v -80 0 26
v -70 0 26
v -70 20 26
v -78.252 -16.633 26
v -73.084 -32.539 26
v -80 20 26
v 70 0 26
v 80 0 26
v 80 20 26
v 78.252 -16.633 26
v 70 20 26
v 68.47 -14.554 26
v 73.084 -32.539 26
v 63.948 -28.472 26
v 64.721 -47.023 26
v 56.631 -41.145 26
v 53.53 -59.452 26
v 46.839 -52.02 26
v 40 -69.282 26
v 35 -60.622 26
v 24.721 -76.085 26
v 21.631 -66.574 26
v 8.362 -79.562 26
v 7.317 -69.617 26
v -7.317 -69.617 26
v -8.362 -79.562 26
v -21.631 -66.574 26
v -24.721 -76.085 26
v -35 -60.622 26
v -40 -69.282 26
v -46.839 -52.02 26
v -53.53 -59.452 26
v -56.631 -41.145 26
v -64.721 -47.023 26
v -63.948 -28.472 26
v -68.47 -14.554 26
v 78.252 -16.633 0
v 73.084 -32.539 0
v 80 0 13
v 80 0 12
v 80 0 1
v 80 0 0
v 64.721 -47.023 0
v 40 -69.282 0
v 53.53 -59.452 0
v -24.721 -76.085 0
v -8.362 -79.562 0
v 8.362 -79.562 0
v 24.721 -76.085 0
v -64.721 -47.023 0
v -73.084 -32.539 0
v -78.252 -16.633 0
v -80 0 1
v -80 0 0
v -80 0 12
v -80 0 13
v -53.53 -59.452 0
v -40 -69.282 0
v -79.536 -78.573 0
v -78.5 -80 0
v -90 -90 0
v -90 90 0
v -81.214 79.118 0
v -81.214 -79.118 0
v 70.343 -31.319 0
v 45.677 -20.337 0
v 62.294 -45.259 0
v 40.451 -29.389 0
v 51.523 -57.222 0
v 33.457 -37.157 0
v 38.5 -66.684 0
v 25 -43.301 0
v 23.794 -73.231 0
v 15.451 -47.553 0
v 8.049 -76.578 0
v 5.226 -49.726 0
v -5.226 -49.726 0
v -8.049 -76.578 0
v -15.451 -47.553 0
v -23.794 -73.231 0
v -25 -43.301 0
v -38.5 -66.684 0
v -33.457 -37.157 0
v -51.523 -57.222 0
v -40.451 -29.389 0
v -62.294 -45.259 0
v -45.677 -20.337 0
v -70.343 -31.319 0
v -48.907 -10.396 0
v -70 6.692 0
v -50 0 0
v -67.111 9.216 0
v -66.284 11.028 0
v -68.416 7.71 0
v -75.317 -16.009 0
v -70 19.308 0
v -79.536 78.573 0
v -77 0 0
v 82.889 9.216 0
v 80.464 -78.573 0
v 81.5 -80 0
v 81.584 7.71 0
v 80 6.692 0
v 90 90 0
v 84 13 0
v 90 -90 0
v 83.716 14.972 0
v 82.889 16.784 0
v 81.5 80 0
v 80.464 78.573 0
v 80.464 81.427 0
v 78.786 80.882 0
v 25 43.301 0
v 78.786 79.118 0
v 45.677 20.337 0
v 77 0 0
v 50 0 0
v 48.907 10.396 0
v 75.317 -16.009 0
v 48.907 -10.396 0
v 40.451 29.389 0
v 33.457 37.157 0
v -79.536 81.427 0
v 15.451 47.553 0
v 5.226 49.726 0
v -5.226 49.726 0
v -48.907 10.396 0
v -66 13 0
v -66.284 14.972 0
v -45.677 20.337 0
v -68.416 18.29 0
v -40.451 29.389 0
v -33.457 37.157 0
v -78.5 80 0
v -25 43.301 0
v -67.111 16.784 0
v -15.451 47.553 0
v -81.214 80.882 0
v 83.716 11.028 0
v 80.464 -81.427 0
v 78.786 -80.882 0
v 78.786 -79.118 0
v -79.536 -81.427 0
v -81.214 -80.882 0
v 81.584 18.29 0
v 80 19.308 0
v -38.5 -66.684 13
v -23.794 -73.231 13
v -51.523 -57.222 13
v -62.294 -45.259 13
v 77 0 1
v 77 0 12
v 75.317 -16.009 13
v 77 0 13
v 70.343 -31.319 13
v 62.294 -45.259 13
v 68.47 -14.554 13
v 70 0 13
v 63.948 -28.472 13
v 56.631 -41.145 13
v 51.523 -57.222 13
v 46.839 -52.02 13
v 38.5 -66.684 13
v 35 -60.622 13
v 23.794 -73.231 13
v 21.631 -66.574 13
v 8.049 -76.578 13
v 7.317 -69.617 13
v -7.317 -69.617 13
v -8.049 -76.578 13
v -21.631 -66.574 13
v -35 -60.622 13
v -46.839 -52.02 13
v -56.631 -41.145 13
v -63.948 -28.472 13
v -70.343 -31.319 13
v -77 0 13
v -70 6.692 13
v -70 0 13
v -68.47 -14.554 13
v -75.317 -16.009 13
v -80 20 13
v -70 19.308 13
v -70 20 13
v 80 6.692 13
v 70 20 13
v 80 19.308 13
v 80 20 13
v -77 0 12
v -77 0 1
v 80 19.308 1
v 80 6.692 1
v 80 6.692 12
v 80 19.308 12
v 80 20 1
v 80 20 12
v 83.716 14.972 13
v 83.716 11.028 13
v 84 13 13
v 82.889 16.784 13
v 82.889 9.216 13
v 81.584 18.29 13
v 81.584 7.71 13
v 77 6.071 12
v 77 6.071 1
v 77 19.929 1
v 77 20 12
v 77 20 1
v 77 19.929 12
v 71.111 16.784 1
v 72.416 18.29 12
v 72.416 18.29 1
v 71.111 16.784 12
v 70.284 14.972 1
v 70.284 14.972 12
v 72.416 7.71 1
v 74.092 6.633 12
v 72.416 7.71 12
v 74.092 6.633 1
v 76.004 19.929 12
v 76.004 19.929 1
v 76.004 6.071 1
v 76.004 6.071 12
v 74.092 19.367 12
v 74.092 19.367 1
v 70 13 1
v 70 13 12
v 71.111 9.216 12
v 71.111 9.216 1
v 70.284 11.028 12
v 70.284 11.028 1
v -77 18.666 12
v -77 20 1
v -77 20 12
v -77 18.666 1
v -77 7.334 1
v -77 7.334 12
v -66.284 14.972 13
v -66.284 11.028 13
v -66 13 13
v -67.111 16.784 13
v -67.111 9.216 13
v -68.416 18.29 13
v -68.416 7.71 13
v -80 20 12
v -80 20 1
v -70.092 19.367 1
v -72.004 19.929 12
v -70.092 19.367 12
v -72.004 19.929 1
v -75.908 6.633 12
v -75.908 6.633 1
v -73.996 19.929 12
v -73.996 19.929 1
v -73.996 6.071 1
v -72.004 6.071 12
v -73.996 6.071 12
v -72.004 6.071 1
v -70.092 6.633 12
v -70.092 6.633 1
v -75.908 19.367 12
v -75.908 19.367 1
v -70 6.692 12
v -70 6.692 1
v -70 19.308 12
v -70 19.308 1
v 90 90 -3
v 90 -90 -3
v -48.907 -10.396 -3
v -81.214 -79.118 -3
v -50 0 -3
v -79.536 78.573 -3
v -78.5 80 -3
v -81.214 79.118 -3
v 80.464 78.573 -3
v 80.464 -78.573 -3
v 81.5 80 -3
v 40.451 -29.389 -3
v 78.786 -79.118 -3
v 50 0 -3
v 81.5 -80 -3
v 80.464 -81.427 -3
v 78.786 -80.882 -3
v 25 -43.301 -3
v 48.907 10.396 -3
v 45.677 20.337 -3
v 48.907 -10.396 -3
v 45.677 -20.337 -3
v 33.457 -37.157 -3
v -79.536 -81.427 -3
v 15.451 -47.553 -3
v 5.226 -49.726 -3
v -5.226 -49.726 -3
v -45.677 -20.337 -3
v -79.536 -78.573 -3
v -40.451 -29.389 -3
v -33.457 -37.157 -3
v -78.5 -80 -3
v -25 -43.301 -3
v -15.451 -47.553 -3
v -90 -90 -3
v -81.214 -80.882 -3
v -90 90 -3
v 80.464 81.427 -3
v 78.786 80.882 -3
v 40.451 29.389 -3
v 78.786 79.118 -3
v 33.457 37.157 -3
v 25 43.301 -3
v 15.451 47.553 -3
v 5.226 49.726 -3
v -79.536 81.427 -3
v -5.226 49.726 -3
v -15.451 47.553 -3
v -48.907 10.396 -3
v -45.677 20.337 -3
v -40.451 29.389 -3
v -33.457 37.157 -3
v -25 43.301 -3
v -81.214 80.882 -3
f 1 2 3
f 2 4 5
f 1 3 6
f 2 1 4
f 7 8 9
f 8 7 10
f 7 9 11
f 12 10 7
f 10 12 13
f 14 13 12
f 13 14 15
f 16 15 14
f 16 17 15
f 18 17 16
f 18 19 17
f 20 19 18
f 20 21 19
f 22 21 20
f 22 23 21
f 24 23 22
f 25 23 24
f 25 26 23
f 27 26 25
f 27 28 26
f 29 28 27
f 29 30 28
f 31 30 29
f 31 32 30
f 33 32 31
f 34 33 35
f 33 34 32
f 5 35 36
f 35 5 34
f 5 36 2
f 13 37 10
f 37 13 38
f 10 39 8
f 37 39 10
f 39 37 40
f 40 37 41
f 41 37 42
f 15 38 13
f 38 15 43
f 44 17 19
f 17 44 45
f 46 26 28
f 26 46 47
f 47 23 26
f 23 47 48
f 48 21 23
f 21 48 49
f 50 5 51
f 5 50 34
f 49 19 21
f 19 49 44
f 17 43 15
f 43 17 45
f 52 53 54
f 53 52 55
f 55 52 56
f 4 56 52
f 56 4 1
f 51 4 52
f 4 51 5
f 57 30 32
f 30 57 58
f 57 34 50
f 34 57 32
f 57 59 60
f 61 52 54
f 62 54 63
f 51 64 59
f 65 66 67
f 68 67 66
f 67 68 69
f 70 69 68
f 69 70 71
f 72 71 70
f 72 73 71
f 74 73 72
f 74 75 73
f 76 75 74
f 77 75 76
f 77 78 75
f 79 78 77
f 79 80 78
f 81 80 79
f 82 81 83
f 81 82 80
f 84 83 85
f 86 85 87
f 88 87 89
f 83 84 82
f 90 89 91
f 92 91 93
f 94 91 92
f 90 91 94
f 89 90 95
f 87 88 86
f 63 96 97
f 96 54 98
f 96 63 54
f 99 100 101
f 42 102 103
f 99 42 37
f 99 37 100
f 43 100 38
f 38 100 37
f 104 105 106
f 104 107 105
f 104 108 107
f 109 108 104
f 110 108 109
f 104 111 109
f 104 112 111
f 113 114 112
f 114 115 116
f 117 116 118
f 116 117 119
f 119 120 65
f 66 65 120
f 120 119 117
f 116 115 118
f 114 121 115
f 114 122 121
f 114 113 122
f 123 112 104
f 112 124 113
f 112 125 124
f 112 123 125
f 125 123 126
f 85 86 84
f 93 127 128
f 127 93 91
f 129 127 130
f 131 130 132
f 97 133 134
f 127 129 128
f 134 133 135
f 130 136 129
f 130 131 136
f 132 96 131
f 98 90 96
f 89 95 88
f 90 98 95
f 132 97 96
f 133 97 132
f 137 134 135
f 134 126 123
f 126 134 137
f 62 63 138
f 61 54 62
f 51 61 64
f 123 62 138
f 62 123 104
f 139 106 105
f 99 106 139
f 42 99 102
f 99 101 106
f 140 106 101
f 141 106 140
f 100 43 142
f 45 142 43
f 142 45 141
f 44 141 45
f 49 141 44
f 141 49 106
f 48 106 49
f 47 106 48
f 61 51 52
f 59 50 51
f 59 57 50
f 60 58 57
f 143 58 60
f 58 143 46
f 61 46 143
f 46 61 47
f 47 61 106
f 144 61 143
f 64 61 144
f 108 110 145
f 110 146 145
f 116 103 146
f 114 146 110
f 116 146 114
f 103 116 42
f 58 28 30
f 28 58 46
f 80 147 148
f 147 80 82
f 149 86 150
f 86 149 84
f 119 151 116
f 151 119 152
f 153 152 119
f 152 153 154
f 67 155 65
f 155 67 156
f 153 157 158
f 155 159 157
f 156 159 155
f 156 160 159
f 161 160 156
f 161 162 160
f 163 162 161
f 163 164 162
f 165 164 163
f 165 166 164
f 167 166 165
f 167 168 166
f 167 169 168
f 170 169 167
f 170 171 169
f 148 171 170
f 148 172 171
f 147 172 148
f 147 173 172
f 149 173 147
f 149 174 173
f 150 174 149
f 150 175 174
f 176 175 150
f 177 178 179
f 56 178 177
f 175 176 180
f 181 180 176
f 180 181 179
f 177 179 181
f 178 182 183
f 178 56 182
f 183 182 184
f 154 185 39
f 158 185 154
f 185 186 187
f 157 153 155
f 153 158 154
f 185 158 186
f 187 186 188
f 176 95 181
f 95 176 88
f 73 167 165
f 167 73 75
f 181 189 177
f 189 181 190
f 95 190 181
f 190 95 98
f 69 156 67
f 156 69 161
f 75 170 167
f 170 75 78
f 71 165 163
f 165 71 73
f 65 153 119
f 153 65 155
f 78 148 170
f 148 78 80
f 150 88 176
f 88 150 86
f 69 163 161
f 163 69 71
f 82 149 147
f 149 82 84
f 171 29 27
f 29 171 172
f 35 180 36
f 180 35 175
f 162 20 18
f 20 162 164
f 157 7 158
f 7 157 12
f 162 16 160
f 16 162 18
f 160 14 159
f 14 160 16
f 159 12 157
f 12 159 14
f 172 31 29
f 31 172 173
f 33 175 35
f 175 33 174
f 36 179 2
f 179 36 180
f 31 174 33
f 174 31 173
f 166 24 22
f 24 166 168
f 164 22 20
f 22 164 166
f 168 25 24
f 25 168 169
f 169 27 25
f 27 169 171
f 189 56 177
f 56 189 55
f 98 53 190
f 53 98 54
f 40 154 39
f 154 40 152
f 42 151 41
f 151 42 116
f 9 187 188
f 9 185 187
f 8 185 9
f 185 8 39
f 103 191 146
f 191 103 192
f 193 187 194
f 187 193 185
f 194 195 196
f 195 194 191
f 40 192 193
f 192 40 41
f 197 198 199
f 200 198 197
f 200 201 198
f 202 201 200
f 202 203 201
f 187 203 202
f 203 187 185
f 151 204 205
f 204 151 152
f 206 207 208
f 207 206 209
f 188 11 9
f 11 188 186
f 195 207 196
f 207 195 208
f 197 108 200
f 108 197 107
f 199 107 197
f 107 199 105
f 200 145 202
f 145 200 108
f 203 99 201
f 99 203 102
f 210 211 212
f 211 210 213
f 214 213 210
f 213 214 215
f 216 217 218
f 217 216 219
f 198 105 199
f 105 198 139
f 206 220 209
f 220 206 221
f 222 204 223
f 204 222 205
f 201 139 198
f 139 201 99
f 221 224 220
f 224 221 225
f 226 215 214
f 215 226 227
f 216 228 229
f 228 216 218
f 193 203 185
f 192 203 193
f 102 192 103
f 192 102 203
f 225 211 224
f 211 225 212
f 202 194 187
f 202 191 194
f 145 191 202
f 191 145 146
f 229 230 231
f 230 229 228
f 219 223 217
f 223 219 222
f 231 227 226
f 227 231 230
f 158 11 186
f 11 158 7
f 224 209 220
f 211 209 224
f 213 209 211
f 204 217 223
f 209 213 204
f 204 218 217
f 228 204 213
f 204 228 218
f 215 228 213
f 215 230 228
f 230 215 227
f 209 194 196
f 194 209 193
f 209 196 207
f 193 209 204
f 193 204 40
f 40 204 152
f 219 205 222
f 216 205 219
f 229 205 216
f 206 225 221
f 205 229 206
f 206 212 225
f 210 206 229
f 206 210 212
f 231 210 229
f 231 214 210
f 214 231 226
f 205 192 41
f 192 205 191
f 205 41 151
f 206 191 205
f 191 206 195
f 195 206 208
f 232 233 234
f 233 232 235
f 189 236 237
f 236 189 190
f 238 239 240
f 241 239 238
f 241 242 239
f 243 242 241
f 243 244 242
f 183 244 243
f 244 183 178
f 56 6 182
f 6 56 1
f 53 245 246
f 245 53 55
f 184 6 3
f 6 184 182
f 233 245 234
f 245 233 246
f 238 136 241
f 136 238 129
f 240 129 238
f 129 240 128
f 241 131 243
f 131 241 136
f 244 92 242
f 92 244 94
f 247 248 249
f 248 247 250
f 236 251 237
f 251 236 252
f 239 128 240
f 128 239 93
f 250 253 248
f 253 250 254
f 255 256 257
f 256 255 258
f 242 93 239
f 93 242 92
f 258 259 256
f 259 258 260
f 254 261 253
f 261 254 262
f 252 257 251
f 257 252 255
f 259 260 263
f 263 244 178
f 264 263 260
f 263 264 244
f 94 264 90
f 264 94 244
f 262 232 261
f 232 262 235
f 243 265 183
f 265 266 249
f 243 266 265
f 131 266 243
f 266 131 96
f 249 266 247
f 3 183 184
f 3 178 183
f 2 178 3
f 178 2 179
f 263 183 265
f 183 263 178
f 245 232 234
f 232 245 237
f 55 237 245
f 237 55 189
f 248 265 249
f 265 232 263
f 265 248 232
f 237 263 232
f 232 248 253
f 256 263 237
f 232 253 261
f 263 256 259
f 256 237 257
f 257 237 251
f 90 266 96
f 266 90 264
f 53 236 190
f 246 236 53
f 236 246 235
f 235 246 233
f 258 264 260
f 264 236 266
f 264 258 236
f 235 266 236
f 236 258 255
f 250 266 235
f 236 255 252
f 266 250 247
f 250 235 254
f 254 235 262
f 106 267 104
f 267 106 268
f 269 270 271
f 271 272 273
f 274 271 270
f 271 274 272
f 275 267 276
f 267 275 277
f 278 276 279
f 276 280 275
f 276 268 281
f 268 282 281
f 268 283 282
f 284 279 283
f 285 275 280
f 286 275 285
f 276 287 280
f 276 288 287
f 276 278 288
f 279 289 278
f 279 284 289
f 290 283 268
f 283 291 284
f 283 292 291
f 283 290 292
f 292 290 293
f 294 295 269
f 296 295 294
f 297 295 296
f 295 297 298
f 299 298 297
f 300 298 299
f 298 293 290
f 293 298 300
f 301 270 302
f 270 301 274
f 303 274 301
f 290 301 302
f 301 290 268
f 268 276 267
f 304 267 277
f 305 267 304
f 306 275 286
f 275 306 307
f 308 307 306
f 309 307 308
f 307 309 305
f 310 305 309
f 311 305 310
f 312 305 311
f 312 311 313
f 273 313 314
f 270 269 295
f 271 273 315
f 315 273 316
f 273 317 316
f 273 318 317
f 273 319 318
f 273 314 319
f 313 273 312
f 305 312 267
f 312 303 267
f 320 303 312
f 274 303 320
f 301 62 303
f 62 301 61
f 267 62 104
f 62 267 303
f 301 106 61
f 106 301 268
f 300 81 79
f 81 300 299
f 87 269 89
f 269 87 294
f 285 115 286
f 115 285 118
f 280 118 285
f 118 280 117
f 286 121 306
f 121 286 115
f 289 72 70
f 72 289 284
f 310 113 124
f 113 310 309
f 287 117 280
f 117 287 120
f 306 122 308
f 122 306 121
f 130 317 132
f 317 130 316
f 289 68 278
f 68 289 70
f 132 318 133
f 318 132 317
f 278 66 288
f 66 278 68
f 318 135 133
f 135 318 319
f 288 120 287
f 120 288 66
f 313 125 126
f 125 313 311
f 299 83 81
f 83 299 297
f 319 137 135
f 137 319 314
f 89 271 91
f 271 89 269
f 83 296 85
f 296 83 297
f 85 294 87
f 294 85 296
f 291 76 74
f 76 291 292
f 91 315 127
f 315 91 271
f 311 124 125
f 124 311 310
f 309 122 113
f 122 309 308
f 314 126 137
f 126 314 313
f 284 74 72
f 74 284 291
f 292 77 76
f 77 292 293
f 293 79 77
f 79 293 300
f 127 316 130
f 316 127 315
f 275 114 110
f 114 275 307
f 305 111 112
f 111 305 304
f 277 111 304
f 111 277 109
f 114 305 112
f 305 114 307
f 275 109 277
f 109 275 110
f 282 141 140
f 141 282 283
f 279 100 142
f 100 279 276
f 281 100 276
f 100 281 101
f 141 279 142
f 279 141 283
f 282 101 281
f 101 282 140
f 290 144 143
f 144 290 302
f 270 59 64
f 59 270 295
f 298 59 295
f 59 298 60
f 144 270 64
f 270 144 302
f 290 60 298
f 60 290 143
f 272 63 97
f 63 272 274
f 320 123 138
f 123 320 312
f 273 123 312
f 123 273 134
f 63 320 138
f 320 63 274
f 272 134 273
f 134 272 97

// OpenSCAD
//toshiba air duct reducer

/* Measurements:
ring at end of toshiba provided ducting:
(measured from adapter ring to sqaure duct piece)
height: 13.40mm - 13?
outer diameter > 153mm.... caliper too small
diameter by ruler - 156ish so 155mm?
closer diameter by ruler - outer 154. maybe 155 or 153.. ugh test print fit

ring on louverd flap:

wall cutout:


*/

/* TODO
- add cutout so cosmetic upper half of ring (for ducting receiver) can be slid on top after inserting ducting?
- screw holes

*/

//30.58m filament, 6h44m print time

ductRingHeight = 13;
ductRingOuterDiameter = 154;
ductRingInnerDiameter = 140;
ductRingWidth = (ductRingOuterDiameter - ductRingInnerDiameter)/2;
ductRingCouplerWallThickness = 3;
clipVerticalGap = 1;

arbitraryDuctReceiverHeightPadding = 20;
arbitraryWallPlateThickness = 3;

ventRingOuterDiameter = 100; //TODO measure!!!!!!!!!!!!!!!!!!!!!!!!!!!!!! thi sis the hole in the wall p.ate

wallPlateWidth = 180;
screwHoleDiameter = 3;
screwHoleInset = 10;

difference(){
    //outer body of accepting ring for duct
    cylinder(ductRingHeight*2,ductRingOuterDiameter/2 + ductRingCouplerWallThickness,ductRingOuterDiameter/2 + ductRingCouplerWallThickness);
    
    //remove area for ring at end of ducting
    cylinder(ductRingHeight,ductRingOuterDiameter/2,ductRingOuterDiameter/2);
    
    //remove area down-duct from outer ring of ducting
    translate([0,0,ductRingHeight]){
        cylinder(ductRingHeight,ductRingInnerDiameter/2,ductRingInnerDiameter/2);
    }
    
    //remove top half of ring so duct can slid in
    translate([-(ductRingOuterDiameter/2 + ductRingCouplerWallThickness),0,0]){
        cube([ductRingOuterDiameter+ductRingCouplerWallThickness*2,ductRingOuterDiameter/2 + ductRingCouplerWallThickness,ductRingHeight*2]);
    }
}


//add cubes to extend up receving ring (for ducting)
//+x side
translate([(ductRingOuterDiameter/2),0,0]){
    difference(){
        union(){
            //lower wall
            cube([ductRingCouplerWallThickness,arbitraryDuctReceiverHeightPadding,ductRingHeight]);
            
            //clip bump
            translate([0,arbitraryDuctReceiverHeightPadding-ductRingWidth,0]){
                cylinder(ductRingHeight,ductRingWidth,ductRingWidth);
            }
            
            //upper wall
            translate([-ductRingWidth,0,ductRingHeight]){
                cube([ductRingCouplerWallThickness+ductRingWidth,arbitraryDuctReceiverHeightPadding,ductRingHeight]);
            }
        }//end union
        
        //top clip gap
        translate([-ductRingWidth,0,ductRingHeight-clipVerticalGap]){
            cube([ductRingCouplerWallThickness+ductRingWidth,arbitraryDuctReceiverHeightPadding,clipVerticalGap]);
        }
        
        //bottom clip gap
        translate([-ductRingWidth,0,0]){
            cube([ductRingCouplerWallThickness+ductRingWidth,arbitraryDuctReceiverHeightPadding,clipVerticalGap]);
        }
    }//end diff
}

//-x side
translate([-(ductRingOuterDiameter/2) - ductRingCouplerWallThickness,0,0]){
    difference(){
        union(){
            //lower wall
            cube([ductRingCouplerWallThickness,arbitraryDuctReceiverHeightPadding,ductRingHeight]);
    
    //clip bump
    translate([ductRingWidth,arbitraryDuctReceiverHeightPadding-ductRingWidth,0]){
        cylinder(ductRingHeight,ductRingWidth,ductRingWidth);
    }
    
    //uppper wall
    translate([-0,0,ductRingHeight]){
        cube([ductRingCouplerWallThickness+ductRingWidth,arbitraryDuctReceiverHeightPadding,ductRingHeight]);
    }
        }//end union
        
        //top clip gap
        translate([0,0,ductRingHeight-clipVerticalGap]){
            cube([ductRingCouplerWallThickness+ductRingWidth,arbitraryDuctReceiverHeightPadding,clipVerticalGap]);
        }
        
        //bottom clip gap
        translate([0,0,0]){
            cube([ductRingCouplerWallThickness+ductRingWidth,arbitraryDuctReceiverHeightPadding,clipVerticalGap]);
        }
    }//end diff
}


////add cubes to extend up receving ring (for ducting)
////+x side
//translate([(ductRingOuterDiameter/2),0,0]){
//cube([ductRingCouplerWallThickness,arbitraryDuctReceiverHeightPadding,ductRingHeight]);
//    
//    translate([-ductRingWidth,0,ductRingHeight]){
//        cube([ductRingCouplerWallThickness+ductRingWidth,arbitraryDuctReceiverHeightPadding,ductRingHeight]);
//    }
//}
//
////-x side
//translate([-(ductRingOuterDiameter/2) - ductRingCouplerWallThickness,0,0]){
//cube([ductRingCouplerWallThickness,arbitraryDuctReceiverHeightPadding,ductRingHeight]);
//    
//    translate([-0,0,ductRingHeight]){
//        cube([ductRingCouplerWallThickness+ductRingWidth,arbitraryDuctReceiverHeightPadding,ductRingHeight]);
//    }
//}


//wall plate
difference(){
    translate([-wallPlateWidth/2,-wallPlateWidth/2,-arbitraryWallPlateThickness]){
        cube([wallPlateWidth,wallPlateWidth,arbitraryWallPlateThickness]);
    }

    translate([0,0,-arbitraryWallPlateThickness]){
    //remove hole for venting
        //todo change to flap diameter
    cylinder(arbitraryWallPlateThickness,ventRingOuterDiameter/2,ventRingOuterDiameter/2);
    }
    
    translate([wallPlateWidth/2-screwHoleInset,wallPlateWidth/2-screwHoleInset,-arbitraryWallPlateThickness]){
        cylinder(arbitraryWallPlateThickness,screwHoleDiameter/2,screwHoleDiameter/2);
    }
    
    translate([wallPlateWidth/2-screwHoleInset,-(wallPlateWidth/2-screwHoleInset),-arbitraryWallPlateThickness]){
        cylinder(arbitraryWallPlateThickness,screwHoleDiameter/2,screwHoleDiameter/2);
    }
    
    translate([-(wallPlateWidth/2-screwHoleInset),-(wallPlateWidth/2-screwHoleInset),-arbitraryWallPlateThickness]){
        cylinder(arbitraryWallPlateThickness,screwHoleDiameter/2,screwHoleDiameter/2);
    }
    
    translate([-(wallPlateWidth/2-screwHoleInset),wallPlateWidth/2-screwHoleInset,-arbitraryWallPlateThickness]){
        cylinder(arbitraryWallPlateThickness,screwHoleDiameter/2,screwHoleDiameter/2);
    }
}


////wall plate
//difference(){
//    translate([-wallPlateWidth/2,-wallPlateWidth/2,-arbitraryWallPlateThickness]){
//        cube([wallPlateWidth,wallPlateWidth,arbitraryWallPlateThickness]);
//    }
//
//    translate([0,0,-arbitraryWallPlateThickness]){
//    //remove hole for venting
//        //todo change to flap diameter
//    cylinder(arbitraryWallPlateThickness,ductRingInnerDiameter/2,ductRingInnerDiameter/2);
//    }
//}
